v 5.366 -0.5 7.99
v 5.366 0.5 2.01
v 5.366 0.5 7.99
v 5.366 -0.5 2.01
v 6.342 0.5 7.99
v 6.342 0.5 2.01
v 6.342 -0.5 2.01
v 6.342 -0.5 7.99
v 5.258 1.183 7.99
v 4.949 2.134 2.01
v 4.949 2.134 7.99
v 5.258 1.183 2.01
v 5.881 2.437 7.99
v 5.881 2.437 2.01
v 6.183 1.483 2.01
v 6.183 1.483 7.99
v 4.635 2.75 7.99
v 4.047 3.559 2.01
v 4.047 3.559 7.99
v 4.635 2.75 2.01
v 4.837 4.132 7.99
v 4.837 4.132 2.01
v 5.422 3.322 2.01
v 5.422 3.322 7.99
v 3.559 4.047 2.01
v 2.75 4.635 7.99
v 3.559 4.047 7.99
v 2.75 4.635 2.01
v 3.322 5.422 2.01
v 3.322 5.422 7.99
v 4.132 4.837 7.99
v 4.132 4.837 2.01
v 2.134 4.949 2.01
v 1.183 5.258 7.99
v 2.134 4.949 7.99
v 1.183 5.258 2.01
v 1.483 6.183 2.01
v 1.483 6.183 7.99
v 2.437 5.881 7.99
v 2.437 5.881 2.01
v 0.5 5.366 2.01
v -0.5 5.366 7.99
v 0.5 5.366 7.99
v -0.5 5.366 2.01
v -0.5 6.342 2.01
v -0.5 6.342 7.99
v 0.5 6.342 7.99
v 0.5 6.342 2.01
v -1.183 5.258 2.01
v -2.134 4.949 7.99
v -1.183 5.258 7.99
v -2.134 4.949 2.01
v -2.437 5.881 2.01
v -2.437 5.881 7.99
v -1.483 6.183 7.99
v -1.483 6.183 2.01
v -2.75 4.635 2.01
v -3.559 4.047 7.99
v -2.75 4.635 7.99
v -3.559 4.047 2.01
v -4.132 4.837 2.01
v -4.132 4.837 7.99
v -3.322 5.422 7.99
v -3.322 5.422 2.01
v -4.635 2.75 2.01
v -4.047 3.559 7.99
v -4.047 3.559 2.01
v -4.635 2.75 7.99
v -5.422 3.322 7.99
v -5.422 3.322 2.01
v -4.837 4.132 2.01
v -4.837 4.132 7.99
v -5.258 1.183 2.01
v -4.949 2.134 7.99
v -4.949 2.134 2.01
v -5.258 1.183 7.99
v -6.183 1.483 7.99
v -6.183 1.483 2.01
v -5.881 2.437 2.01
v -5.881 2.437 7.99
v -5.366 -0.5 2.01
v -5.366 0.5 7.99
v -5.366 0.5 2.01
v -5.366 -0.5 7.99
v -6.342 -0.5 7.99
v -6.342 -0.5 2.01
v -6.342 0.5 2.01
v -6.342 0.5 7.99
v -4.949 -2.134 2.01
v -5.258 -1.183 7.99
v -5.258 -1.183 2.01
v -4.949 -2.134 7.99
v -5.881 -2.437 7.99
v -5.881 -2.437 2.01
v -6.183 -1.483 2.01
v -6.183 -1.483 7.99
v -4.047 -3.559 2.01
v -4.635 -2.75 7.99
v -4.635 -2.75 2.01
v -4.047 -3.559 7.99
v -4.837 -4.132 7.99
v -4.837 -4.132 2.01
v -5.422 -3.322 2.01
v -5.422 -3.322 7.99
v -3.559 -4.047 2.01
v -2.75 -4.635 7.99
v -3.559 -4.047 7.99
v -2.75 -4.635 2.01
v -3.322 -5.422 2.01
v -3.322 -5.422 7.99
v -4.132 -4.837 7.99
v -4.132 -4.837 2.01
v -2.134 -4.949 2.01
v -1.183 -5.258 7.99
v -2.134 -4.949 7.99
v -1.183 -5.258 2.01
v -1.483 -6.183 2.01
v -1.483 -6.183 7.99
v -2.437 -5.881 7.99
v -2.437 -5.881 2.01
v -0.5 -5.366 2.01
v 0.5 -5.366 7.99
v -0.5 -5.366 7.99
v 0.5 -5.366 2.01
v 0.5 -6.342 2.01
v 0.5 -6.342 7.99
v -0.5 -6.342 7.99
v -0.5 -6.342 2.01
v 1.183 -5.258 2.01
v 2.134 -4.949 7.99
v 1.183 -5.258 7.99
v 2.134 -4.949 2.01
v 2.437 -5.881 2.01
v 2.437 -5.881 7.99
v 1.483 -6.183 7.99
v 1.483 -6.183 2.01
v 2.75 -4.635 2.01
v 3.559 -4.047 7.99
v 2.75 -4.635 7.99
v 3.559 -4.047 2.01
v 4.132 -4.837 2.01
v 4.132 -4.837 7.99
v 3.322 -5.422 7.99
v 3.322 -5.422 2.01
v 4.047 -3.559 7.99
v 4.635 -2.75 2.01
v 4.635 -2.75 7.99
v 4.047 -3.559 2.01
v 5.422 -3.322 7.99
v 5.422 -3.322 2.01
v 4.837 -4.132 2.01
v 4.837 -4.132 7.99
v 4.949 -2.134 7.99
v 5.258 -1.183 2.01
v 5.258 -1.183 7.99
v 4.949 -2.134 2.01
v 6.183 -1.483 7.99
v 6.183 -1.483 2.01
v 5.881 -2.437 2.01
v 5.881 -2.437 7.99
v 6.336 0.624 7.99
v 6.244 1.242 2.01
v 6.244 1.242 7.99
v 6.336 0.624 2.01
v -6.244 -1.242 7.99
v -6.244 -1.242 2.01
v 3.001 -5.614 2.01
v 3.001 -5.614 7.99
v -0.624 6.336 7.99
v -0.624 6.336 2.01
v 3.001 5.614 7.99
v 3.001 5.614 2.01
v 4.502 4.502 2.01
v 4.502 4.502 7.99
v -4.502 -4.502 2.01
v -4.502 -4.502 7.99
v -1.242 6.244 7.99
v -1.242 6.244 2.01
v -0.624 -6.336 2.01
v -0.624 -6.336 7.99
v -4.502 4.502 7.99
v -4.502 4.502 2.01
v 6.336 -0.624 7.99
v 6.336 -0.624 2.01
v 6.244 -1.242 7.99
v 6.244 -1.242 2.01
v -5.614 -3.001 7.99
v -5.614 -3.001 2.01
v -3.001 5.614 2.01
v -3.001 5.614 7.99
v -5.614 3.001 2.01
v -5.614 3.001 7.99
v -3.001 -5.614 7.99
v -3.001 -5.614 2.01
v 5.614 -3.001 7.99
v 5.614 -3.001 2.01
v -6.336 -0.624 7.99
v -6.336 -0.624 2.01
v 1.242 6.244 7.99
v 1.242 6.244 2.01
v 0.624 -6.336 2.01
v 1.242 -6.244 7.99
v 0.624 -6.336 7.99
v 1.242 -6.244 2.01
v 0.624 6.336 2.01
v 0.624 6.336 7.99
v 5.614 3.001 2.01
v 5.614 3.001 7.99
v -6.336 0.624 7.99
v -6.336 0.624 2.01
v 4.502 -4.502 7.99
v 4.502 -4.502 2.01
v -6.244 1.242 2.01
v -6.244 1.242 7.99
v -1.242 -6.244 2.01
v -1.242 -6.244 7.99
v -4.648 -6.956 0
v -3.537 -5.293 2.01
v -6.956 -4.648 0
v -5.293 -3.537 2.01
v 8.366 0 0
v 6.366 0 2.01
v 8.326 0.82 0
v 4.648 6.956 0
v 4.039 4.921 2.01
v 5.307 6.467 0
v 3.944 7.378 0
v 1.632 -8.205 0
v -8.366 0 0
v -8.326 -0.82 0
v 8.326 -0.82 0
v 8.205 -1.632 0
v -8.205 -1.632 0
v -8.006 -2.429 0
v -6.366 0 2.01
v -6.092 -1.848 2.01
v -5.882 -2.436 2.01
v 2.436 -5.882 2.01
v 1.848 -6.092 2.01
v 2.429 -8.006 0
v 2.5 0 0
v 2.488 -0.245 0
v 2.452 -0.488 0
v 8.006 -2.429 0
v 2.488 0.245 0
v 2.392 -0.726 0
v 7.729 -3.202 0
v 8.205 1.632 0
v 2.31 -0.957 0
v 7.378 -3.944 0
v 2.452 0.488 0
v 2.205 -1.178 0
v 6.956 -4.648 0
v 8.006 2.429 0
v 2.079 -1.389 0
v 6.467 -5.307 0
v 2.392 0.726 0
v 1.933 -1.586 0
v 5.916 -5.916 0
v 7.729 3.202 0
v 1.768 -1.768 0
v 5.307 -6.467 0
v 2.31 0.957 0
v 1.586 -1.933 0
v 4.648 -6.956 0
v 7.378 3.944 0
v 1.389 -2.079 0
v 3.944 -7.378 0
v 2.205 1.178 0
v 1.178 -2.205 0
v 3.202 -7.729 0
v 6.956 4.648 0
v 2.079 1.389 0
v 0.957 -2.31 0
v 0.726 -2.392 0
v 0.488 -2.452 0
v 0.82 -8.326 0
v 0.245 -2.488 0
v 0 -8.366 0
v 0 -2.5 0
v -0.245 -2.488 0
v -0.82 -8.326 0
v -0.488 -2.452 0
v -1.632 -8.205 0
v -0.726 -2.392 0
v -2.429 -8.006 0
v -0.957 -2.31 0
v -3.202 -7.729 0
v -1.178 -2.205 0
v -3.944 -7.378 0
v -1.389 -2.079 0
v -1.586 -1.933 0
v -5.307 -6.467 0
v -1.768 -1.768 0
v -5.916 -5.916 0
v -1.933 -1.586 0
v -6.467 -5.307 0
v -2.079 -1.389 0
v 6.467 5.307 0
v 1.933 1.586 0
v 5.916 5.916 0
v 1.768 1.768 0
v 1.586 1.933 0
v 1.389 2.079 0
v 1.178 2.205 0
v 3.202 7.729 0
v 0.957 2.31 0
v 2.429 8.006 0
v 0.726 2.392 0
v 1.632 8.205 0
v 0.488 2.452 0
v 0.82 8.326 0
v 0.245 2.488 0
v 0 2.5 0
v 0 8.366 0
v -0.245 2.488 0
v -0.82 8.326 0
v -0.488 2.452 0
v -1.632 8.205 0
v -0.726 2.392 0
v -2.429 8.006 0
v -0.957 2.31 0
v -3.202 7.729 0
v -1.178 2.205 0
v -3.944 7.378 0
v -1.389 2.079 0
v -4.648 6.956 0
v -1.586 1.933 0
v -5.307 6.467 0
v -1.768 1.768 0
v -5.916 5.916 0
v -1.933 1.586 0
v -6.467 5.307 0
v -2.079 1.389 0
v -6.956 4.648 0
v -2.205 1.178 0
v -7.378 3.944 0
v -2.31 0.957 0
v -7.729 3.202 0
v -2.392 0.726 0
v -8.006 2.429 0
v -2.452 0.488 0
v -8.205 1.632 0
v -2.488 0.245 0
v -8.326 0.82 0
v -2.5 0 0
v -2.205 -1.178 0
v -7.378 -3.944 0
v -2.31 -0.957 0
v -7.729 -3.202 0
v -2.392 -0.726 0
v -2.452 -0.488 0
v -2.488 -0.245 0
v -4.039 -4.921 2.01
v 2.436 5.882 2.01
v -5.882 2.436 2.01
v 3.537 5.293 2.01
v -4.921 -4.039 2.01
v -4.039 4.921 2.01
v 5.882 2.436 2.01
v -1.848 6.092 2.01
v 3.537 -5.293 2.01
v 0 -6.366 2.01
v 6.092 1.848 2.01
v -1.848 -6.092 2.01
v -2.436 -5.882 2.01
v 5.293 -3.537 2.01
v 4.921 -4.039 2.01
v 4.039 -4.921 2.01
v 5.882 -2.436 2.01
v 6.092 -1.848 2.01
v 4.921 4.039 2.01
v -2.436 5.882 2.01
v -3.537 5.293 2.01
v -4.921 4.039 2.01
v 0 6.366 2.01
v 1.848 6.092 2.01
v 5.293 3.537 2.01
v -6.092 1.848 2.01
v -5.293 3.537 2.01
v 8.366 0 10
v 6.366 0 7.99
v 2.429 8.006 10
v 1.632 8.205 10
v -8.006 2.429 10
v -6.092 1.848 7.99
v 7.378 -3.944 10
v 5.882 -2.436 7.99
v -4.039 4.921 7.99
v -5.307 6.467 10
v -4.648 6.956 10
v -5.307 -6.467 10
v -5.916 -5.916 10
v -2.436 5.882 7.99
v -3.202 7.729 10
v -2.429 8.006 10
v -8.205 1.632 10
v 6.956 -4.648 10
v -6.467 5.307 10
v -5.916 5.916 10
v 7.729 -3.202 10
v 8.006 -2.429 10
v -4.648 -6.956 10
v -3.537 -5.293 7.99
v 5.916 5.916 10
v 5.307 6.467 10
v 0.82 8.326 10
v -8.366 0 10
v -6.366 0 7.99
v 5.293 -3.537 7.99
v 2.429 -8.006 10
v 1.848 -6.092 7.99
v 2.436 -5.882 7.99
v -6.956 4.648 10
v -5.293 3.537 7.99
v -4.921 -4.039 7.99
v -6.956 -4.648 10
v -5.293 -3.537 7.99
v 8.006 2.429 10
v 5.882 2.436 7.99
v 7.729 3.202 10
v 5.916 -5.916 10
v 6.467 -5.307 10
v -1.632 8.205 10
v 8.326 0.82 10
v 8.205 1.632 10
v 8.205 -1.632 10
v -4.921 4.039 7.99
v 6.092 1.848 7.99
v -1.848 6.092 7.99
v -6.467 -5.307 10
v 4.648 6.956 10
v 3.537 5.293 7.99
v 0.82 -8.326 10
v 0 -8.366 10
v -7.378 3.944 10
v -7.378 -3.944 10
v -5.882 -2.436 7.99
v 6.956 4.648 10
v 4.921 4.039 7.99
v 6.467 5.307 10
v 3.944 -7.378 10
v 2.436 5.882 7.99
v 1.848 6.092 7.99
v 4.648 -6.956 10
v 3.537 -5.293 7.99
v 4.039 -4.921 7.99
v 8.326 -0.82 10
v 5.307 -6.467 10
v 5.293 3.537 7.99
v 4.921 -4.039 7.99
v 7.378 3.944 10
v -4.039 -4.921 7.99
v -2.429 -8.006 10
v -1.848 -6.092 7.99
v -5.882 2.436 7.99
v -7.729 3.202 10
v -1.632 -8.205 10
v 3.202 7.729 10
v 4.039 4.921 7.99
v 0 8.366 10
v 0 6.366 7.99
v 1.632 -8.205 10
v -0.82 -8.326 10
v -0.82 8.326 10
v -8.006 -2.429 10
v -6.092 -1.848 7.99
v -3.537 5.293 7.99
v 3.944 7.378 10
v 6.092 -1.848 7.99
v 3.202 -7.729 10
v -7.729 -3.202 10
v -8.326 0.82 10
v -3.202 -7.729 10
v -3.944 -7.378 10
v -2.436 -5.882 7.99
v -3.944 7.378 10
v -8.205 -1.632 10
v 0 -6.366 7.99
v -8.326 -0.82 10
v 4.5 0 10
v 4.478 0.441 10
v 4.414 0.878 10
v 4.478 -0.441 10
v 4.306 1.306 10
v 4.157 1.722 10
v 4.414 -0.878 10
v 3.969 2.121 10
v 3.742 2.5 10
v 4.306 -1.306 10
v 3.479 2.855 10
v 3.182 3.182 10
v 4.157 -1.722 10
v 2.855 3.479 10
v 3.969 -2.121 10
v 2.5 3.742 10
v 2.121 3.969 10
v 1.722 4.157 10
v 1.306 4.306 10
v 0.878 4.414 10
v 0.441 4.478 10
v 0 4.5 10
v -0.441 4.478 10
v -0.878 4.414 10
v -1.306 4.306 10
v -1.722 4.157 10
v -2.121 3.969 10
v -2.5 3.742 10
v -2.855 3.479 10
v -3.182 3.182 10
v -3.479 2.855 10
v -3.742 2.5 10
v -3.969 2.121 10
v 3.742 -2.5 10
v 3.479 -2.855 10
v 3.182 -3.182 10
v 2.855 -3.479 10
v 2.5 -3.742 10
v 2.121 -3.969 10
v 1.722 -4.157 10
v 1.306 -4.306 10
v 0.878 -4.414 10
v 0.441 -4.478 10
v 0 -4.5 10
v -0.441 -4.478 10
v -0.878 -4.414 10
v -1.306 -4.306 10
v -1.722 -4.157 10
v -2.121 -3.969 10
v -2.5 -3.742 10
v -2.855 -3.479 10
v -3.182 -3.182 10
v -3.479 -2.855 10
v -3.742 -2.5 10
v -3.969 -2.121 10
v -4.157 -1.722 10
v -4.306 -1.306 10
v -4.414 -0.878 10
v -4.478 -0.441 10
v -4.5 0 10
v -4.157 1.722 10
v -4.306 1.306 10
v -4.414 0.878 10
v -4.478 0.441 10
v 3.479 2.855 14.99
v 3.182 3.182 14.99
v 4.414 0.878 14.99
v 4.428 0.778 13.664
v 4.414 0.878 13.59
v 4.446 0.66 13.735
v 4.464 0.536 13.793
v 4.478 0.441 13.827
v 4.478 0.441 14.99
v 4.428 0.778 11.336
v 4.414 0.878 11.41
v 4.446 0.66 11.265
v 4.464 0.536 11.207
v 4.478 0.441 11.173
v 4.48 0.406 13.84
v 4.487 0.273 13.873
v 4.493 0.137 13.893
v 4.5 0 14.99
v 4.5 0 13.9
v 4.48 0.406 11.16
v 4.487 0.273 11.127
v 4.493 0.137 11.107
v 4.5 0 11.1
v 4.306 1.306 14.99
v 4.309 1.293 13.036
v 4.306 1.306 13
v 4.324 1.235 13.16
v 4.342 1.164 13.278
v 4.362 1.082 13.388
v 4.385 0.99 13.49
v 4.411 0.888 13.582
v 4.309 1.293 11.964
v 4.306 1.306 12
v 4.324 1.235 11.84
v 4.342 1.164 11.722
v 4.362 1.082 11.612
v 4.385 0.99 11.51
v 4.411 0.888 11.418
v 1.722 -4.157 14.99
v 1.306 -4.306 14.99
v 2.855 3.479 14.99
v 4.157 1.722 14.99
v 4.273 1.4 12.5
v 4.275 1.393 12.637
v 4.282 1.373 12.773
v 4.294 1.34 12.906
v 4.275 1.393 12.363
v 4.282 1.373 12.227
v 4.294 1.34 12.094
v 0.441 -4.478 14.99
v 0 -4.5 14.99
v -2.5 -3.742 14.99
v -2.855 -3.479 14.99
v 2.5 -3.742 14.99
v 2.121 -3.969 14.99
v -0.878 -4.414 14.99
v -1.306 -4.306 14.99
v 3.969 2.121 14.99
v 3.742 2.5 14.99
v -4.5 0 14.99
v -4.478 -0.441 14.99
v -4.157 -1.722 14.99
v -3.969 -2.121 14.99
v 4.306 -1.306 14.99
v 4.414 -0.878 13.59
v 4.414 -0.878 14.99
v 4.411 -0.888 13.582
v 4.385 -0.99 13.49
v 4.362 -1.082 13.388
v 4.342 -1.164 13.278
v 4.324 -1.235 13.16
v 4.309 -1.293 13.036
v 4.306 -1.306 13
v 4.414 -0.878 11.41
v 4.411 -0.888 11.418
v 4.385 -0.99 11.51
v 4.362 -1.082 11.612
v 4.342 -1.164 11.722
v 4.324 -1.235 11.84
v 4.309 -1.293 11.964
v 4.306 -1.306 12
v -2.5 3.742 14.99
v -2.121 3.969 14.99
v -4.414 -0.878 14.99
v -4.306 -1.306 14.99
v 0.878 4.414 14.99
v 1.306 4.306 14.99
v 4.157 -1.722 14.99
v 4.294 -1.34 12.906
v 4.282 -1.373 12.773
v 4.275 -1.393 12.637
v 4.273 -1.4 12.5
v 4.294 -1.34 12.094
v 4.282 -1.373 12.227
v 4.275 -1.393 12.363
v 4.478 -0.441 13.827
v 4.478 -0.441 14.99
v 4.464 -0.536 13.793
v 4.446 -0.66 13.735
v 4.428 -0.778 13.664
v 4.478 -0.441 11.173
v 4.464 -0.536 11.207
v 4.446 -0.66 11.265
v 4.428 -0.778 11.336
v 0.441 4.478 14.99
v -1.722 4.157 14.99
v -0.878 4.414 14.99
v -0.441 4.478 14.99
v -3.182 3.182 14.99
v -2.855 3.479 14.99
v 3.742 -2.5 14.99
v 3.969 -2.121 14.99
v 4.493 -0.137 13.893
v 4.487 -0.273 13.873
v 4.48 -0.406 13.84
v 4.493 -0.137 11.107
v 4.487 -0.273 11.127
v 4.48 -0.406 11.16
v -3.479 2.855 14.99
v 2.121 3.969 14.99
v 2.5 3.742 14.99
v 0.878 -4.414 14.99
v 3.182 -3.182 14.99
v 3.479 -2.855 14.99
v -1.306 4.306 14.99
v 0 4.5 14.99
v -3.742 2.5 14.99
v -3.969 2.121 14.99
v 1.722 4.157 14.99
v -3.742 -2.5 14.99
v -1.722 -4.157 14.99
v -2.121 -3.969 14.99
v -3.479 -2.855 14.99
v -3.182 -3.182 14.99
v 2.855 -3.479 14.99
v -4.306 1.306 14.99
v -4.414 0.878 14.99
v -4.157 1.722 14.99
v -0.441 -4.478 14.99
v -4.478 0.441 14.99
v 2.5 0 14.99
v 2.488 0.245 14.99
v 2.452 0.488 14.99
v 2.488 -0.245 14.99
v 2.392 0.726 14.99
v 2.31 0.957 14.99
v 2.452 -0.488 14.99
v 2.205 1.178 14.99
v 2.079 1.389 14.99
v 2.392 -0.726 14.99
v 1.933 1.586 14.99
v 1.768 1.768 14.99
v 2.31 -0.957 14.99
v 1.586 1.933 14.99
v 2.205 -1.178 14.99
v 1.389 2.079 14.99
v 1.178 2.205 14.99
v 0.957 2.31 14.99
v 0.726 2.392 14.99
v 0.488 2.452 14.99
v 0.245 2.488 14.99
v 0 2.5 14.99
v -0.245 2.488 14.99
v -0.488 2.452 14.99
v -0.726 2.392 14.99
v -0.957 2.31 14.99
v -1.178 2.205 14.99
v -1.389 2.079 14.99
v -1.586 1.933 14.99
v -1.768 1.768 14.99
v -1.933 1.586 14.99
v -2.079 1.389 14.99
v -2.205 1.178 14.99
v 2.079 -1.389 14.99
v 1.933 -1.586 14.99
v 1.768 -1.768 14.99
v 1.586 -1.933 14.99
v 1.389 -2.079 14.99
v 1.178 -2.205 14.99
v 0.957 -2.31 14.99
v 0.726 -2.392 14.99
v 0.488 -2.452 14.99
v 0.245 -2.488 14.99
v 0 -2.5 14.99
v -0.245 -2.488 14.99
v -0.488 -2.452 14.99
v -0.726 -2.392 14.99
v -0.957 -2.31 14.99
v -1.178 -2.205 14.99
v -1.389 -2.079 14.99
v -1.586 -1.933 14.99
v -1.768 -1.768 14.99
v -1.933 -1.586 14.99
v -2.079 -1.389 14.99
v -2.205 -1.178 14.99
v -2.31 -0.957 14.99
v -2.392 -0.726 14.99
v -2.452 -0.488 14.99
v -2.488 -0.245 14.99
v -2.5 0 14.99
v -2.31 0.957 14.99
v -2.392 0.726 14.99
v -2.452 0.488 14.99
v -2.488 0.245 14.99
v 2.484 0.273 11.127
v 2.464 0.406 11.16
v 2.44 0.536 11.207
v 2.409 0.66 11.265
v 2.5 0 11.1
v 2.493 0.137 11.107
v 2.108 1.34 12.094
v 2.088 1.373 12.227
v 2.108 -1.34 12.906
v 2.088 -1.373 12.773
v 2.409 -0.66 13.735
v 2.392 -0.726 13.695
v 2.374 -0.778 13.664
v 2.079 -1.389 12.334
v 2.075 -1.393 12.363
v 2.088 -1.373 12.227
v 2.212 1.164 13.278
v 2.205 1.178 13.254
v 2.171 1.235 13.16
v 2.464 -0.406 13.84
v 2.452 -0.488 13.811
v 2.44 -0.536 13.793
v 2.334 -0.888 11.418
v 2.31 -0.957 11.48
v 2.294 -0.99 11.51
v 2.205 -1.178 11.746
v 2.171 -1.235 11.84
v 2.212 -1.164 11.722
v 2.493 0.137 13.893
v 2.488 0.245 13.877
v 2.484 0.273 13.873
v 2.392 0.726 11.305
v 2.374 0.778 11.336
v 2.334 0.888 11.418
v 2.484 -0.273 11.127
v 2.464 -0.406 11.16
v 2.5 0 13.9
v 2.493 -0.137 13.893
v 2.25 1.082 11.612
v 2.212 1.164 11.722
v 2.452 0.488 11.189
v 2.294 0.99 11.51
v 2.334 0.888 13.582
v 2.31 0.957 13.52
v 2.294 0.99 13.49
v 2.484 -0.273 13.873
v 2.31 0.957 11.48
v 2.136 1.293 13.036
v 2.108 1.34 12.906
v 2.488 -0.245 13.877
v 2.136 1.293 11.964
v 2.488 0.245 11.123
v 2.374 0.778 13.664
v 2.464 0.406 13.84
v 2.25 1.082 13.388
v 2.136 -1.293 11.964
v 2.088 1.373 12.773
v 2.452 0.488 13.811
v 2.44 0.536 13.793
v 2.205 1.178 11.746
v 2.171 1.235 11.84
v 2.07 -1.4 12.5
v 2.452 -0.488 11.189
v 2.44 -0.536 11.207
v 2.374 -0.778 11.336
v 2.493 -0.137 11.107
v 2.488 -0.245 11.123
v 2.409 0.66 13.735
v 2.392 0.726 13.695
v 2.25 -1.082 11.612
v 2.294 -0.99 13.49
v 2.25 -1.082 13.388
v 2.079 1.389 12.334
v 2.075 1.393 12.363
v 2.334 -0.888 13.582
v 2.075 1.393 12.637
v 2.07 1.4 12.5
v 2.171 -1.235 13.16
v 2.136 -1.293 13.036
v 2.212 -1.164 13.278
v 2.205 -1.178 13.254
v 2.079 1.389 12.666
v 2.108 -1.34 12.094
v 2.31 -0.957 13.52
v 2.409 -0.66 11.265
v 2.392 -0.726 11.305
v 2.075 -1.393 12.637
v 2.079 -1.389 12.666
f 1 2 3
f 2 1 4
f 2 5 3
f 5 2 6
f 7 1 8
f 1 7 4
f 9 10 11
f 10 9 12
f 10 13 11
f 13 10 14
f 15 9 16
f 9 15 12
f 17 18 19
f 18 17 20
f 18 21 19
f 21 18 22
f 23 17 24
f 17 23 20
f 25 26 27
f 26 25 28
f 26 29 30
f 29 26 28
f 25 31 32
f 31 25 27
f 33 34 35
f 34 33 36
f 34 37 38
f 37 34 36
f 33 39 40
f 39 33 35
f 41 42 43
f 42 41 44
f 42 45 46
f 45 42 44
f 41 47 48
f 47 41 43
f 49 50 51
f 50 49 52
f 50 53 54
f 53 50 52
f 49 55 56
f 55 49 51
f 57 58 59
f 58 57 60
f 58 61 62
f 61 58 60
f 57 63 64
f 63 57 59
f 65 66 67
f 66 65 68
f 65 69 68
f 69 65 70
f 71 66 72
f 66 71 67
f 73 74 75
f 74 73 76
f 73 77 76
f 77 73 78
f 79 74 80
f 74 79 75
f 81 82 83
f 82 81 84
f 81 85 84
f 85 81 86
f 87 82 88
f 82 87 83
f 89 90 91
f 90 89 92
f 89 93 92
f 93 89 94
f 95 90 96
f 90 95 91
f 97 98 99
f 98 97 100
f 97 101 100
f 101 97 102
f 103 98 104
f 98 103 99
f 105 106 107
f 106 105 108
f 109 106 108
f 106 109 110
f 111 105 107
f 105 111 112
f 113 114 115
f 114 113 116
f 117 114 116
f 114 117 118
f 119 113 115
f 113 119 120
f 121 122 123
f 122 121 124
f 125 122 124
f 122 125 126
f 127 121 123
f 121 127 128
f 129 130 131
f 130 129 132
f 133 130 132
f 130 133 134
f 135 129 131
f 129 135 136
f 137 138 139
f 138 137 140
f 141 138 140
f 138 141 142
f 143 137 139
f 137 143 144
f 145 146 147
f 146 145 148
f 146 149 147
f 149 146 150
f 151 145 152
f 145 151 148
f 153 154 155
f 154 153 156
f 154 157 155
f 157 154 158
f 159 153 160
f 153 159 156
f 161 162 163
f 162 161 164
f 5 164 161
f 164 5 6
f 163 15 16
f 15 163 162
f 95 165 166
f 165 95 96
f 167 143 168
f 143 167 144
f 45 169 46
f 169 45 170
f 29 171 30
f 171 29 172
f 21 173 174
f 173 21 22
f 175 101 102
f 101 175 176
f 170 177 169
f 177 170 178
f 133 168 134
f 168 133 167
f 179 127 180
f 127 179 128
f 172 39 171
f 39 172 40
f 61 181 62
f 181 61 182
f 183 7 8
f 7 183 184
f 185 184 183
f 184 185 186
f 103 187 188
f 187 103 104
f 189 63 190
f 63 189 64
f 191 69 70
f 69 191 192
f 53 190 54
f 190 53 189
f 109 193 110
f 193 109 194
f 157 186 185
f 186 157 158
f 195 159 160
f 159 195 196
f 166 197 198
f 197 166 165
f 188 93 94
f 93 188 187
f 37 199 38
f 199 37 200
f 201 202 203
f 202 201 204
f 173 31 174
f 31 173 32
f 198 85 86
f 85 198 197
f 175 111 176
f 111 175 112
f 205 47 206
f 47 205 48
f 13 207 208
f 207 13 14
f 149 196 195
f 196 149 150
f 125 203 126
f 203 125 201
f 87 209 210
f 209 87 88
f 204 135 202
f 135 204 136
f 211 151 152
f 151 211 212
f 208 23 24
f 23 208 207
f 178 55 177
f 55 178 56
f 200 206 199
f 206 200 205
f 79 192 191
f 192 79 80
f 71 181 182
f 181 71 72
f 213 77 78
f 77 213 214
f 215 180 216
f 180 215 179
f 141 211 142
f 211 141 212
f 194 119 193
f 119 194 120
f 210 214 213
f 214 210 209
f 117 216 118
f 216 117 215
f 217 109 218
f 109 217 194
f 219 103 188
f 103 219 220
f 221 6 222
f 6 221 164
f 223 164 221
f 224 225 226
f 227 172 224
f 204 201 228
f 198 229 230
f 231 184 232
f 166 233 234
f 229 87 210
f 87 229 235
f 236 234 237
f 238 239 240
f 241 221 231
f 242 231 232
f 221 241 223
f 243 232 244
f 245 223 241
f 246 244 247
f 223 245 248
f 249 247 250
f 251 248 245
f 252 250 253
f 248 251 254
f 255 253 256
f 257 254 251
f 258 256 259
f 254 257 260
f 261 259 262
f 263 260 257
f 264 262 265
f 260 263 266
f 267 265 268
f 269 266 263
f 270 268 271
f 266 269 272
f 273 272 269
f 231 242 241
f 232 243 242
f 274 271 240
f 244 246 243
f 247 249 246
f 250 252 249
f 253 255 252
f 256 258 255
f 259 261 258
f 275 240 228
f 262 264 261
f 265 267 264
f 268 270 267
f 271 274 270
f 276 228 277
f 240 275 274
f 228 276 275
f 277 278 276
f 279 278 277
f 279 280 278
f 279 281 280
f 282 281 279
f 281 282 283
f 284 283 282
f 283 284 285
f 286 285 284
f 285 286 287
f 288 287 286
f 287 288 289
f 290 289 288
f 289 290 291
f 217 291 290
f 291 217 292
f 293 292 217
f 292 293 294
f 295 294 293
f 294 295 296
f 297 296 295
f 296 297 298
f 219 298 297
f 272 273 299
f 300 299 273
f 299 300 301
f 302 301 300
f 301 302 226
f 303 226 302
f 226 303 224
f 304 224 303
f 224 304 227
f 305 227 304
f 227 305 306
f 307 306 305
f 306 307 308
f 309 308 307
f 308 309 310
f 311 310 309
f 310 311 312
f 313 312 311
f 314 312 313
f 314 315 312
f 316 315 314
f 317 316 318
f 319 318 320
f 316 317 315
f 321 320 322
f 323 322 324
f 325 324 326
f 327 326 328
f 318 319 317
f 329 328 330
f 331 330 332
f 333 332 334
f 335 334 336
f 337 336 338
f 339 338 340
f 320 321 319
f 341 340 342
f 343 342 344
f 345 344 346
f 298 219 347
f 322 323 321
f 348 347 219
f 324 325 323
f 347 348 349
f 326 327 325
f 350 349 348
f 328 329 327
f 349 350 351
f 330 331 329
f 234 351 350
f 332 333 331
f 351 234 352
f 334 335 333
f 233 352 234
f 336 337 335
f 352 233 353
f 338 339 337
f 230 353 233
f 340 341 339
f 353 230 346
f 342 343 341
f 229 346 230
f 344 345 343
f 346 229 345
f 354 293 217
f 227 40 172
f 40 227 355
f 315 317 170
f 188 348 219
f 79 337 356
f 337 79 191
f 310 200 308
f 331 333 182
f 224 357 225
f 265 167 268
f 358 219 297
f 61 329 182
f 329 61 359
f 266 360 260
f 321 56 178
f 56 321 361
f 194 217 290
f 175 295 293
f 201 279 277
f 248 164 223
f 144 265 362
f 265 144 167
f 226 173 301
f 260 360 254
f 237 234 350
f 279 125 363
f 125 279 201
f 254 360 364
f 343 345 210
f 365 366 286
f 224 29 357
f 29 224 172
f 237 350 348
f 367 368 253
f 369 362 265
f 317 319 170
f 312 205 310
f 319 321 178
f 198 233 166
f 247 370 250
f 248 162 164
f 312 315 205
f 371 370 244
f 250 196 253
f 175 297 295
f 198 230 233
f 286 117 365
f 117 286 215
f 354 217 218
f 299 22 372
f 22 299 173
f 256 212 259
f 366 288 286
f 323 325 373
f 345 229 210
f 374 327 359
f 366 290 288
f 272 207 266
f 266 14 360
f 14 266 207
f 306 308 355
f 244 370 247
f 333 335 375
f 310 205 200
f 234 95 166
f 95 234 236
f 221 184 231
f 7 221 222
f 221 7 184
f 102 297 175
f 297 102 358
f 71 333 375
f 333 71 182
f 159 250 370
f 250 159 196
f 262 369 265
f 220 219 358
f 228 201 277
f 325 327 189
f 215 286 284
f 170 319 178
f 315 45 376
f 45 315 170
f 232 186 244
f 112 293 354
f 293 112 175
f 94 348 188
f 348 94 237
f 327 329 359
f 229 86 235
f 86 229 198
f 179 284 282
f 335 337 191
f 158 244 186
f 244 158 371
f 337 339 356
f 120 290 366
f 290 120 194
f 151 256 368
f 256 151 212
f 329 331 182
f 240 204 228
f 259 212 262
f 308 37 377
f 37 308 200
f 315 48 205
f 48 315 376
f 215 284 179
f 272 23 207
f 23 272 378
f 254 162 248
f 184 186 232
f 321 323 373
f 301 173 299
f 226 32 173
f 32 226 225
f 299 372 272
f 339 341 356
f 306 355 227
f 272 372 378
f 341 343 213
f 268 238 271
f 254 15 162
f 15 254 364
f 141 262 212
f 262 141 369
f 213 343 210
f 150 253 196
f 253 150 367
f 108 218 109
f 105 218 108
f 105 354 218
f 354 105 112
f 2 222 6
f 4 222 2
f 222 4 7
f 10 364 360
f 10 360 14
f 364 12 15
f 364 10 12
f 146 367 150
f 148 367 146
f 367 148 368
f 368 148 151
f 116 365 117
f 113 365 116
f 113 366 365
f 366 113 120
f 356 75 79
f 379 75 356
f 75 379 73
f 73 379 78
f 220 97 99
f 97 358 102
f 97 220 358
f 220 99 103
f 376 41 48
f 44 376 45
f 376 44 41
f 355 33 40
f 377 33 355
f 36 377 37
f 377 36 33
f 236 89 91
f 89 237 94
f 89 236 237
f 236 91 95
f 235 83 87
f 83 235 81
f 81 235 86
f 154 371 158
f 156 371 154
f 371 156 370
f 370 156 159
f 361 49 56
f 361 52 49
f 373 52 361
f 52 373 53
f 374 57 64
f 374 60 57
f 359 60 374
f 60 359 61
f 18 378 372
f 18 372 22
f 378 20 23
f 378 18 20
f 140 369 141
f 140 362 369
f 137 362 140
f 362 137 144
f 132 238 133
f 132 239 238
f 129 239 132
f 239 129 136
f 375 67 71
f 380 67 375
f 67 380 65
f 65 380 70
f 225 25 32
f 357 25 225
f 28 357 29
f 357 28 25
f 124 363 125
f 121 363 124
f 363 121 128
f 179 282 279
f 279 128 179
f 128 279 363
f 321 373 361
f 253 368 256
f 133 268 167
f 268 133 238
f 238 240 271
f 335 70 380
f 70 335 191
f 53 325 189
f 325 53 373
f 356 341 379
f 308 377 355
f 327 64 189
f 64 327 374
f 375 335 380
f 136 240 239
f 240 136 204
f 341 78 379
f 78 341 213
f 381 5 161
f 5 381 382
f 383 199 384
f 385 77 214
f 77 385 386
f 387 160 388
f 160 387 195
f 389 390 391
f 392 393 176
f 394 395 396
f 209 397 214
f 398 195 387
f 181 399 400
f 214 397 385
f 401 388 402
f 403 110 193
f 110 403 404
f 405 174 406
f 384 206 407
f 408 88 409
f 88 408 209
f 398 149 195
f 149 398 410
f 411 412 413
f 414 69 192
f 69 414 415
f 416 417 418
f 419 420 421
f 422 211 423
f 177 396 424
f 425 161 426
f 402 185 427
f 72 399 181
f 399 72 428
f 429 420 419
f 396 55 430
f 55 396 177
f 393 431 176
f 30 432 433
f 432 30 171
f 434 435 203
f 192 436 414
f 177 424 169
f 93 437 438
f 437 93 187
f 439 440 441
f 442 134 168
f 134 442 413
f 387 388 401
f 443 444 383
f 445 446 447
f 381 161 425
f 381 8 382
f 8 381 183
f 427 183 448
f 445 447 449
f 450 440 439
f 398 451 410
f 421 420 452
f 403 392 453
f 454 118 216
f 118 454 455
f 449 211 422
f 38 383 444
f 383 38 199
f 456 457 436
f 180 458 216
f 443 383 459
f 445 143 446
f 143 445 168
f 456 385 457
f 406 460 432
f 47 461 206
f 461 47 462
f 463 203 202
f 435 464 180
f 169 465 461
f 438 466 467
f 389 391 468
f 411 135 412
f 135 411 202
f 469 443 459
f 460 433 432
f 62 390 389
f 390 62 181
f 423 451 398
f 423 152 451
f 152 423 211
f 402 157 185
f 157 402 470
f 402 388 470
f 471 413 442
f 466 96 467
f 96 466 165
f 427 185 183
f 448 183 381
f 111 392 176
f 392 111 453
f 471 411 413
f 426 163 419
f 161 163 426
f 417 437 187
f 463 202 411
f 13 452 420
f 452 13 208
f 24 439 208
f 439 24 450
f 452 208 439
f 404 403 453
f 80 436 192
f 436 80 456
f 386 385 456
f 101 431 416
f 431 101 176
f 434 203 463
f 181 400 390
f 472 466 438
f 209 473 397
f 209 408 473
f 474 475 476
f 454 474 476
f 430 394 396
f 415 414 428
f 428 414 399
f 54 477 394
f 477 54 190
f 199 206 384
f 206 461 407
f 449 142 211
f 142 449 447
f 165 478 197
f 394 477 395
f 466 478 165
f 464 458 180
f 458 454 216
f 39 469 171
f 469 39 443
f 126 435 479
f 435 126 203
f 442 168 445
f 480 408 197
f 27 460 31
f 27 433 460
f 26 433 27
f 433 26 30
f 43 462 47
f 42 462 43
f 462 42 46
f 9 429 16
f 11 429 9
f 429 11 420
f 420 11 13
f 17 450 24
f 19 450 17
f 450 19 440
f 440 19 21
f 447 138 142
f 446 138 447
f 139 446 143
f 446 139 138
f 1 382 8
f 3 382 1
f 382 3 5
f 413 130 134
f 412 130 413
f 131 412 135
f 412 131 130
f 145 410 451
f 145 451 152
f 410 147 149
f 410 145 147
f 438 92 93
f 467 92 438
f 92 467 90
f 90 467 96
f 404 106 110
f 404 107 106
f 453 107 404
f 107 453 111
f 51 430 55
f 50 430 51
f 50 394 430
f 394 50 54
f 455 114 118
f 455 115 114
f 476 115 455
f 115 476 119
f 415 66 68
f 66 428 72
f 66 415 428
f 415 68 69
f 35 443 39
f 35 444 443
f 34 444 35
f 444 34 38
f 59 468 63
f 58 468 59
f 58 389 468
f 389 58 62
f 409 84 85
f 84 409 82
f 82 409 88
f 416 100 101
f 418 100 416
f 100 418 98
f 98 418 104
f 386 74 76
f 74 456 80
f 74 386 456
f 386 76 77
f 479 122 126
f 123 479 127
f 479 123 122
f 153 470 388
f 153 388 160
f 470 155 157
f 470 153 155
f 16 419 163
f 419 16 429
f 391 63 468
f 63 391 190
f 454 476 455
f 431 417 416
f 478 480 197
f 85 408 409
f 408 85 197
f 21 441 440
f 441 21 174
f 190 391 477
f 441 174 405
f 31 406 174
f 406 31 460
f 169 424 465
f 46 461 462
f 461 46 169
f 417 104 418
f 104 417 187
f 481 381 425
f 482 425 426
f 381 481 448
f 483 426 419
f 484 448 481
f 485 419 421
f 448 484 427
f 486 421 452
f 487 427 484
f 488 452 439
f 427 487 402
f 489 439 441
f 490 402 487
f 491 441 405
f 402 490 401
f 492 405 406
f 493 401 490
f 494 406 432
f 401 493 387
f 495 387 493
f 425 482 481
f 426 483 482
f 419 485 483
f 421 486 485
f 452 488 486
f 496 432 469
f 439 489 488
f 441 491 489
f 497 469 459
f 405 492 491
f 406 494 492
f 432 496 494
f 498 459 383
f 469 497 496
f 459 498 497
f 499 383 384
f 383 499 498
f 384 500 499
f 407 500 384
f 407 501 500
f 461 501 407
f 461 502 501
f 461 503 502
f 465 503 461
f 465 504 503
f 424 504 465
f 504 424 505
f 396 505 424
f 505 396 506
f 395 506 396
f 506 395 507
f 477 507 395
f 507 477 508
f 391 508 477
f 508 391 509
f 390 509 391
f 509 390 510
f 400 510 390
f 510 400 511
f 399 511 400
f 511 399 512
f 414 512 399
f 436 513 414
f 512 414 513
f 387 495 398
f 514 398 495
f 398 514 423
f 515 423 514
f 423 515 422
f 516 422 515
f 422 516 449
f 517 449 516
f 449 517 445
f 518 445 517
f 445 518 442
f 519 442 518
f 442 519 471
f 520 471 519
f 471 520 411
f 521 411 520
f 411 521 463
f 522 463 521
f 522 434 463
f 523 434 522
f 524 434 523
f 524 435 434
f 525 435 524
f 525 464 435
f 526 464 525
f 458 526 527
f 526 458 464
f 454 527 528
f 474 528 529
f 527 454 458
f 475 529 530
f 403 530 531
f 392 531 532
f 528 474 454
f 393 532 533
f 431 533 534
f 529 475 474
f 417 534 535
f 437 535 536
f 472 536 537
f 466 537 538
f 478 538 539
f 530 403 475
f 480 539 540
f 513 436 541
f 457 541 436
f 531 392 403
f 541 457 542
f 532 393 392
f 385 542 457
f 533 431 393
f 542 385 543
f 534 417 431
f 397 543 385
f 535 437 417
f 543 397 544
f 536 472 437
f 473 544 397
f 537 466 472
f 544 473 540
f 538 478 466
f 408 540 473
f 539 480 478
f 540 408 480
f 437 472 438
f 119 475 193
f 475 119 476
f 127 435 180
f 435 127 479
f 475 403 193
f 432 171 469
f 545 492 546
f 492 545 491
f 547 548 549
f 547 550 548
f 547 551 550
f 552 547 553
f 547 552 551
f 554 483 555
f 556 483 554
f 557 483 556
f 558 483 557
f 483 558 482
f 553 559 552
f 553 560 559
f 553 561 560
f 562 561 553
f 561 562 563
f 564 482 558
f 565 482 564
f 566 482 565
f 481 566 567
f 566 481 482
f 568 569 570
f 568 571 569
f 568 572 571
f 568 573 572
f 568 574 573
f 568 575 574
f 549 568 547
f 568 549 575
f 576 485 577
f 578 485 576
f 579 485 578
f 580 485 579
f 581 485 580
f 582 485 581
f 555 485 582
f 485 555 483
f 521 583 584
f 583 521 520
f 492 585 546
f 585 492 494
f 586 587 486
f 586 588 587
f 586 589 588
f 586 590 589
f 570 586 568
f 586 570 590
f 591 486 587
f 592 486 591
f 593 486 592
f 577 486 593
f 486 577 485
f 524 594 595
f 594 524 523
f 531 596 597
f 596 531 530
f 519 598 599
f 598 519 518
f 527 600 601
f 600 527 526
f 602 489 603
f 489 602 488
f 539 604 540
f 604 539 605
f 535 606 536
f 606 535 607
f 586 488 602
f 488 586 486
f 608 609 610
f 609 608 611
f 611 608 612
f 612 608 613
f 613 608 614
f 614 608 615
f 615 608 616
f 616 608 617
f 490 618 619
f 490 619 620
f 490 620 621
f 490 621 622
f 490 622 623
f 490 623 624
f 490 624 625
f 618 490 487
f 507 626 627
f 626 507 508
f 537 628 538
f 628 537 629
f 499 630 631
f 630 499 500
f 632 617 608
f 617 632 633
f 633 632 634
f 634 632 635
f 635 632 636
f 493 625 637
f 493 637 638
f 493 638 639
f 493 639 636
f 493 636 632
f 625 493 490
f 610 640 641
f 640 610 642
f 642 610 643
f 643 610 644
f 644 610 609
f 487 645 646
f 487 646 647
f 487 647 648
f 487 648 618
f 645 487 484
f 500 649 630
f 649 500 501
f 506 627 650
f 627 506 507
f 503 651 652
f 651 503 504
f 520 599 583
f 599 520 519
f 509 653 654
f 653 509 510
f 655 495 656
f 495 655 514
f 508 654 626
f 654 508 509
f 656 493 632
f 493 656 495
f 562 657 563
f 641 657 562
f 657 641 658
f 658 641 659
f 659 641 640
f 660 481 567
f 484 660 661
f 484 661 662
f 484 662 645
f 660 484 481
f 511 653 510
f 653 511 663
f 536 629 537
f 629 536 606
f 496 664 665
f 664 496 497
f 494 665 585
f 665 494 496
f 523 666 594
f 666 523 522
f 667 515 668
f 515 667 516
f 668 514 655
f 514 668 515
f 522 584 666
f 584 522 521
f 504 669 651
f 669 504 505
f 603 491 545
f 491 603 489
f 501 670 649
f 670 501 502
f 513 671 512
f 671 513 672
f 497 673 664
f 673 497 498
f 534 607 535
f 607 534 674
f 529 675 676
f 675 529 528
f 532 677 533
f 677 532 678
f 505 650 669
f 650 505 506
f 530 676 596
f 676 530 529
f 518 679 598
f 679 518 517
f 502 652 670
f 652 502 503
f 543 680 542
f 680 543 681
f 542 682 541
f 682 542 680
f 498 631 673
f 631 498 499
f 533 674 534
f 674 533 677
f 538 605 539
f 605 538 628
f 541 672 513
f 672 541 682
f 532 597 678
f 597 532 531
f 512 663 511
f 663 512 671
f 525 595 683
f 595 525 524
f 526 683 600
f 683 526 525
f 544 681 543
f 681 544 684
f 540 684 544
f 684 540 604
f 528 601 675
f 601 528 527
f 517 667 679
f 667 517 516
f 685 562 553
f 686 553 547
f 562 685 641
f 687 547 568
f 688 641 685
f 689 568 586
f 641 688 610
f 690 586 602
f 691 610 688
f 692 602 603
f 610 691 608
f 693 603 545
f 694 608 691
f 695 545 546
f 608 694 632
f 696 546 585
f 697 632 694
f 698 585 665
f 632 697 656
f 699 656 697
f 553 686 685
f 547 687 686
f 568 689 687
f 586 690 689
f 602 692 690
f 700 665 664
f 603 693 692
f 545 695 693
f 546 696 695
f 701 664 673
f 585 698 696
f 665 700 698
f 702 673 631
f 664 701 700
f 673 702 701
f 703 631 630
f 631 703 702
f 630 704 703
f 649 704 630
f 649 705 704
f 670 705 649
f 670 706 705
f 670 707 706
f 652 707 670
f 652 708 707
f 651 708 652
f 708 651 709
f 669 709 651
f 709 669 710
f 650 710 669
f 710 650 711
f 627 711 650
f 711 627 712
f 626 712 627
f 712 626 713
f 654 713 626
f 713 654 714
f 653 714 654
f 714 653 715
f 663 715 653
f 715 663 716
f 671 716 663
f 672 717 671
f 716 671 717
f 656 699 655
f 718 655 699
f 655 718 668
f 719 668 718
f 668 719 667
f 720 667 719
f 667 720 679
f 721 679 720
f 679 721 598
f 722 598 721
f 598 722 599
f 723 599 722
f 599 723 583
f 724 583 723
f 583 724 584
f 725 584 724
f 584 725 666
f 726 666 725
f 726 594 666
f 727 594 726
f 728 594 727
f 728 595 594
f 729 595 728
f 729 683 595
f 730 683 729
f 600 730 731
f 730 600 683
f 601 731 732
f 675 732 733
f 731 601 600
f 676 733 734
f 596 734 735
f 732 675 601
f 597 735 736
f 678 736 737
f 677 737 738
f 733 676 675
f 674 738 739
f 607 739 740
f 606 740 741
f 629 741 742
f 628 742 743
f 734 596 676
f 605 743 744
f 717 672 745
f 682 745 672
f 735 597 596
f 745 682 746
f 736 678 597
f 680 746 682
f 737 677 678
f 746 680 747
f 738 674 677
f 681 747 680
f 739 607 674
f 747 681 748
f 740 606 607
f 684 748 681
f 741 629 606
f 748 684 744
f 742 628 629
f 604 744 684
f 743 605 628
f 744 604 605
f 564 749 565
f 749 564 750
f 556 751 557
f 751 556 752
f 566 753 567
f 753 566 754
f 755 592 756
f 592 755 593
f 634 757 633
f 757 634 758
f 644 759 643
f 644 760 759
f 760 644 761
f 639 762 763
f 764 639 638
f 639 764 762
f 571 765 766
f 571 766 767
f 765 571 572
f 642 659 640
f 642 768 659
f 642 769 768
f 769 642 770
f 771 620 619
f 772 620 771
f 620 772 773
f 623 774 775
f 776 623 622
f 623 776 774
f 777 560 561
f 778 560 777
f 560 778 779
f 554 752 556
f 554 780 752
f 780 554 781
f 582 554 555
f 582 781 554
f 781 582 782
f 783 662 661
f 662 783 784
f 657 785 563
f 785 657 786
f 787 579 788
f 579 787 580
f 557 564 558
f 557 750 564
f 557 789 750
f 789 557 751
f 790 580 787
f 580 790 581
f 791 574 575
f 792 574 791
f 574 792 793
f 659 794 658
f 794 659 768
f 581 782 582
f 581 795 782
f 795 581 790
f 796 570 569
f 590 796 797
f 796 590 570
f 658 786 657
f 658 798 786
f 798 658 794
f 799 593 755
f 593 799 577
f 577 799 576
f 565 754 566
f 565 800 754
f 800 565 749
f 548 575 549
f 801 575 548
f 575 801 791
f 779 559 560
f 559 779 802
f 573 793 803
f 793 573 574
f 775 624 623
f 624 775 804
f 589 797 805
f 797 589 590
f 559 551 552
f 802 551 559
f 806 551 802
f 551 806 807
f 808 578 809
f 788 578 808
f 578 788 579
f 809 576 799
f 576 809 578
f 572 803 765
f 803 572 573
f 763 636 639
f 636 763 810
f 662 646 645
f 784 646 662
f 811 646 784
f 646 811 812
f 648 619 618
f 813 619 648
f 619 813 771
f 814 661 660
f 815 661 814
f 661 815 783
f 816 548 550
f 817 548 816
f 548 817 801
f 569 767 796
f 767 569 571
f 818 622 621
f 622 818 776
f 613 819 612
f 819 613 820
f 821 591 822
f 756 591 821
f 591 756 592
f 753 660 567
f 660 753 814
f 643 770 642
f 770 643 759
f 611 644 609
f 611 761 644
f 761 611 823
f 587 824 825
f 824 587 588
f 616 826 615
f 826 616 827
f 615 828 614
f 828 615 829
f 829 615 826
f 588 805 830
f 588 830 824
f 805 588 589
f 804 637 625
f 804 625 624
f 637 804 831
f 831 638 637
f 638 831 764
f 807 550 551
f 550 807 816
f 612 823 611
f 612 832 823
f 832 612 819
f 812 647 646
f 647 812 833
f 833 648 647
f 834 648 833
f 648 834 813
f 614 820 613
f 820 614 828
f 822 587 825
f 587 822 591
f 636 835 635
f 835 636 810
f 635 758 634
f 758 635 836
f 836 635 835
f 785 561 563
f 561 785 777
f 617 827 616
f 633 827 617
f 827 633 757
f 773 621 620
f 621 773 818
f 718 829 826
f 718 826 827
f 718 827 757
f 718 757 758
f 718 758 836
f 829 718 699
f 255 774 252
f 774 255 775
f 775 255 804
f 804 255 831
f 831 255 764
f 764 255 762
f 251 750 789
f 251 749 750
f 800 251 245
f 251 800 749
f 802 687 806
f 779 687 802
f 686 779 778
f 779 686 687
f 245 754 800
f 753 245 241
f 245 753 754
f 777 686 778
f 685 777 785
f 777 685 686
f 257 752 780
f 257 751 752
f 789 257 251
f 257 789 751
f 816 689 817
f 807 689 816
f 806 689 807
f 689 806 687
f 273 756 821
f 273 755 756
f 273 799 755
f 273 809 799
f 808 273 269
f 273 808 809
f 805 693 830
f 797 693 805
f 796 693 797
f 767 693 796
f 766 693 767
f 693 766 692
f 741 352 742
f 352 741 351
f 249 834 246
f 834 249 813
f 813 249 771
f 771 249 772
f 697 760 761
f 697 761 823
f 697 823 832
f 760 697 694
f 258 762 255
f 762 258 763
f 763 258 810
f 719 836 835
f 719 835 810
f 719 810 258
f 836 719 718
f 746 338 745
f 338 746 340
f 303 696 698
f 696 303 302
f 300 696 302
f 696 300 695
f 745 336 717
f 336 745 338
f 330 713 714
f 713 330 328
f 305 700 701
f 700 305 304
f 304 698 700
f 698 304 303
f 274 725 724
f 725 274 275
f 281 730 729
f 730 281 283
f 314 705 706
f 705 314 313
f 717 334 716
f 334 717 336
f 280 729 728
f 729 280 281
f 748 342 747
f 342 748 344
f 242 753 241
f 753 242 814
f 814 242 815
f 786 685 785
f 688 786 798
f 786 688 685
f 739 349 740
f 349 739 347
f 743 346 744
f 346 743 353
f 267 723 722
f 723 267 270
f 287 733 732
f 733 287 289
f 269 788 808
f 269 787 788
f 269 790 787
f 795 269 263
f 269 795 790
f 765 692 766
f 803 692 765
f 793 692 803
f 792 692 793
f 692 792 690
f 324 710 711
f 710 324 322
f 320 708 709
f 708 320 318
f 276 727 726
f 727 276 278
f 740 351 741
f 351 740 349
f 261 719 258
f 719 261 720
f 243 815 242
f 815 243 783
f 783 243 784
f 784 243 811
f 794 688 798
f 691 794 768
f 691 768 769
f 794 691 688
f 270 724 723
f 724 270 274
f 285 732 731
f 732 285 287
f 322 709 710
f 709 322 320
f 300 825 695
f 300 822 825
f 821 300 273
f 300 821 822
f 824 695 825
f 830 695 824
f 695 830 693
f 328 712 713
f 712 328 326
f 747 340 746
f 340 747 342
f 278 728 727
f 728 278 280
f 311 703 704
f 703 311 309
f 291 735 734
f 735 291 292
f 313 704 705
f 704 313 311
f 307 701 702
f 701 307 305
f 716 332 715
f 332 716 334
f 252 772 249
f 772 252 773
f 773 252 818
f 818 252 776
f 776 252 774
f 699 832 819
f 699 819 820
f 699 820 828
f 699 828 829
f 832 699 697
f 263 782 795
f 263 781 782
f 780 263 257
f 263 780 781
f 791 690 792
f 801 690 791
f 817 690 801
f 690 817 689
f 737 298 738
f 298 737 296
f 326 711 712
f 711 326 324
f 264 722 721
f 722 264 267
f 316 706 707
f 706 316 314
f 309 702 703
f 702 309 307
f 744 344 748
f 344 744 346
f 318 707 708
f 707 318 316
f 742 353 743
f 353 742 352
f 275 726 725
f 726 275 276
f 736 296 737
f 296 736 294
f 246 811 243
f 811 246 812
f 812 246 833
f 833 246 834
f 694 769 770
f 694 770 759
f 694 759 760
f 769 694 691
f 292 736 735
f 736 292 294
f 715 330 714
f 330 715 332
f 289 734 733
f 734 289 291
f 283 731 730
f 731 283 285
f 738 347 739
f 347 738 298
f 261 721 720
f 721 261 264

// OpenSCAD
/* [Global] */

// Tooth size of belt
tb=1;

// Number of teeth on wheel
tn=20;

// Width of belt (add a bit)
b=6;

// diameter of motor axis
hd=5;

/* [Hidden] */

u=2*tb*tn;
r=u/PI/2;
a=360/tn;

$fn=64;

difference() {
  union() {
    cylinder(2.01,r+2.0,r);

    translate([0,0,2])
    difference() {
      cylinder(b,r,r);
      for (x = [0 : tn-1]) {
        rotate([0,0,x*a]) translate([r-tb,-tb/2,-0.1]) cube([tb*2,tb,b+0.2]);
      }
    }

    translate([0,0,b+1.99]) cylinder(2.01,r,r+2);
    translate([0,0,b+3.99]) cylinder(hd,hd/2+2,hd/2+2);
  }

  translate([0,0,b+4+hd/2]) rotate([0,90,0]) cylinder(hd/2+3,1.4,1.4);
  translate([0,0,-0.01]) cylinder(b+hd+4.1,hd/2,hd/2);
}
